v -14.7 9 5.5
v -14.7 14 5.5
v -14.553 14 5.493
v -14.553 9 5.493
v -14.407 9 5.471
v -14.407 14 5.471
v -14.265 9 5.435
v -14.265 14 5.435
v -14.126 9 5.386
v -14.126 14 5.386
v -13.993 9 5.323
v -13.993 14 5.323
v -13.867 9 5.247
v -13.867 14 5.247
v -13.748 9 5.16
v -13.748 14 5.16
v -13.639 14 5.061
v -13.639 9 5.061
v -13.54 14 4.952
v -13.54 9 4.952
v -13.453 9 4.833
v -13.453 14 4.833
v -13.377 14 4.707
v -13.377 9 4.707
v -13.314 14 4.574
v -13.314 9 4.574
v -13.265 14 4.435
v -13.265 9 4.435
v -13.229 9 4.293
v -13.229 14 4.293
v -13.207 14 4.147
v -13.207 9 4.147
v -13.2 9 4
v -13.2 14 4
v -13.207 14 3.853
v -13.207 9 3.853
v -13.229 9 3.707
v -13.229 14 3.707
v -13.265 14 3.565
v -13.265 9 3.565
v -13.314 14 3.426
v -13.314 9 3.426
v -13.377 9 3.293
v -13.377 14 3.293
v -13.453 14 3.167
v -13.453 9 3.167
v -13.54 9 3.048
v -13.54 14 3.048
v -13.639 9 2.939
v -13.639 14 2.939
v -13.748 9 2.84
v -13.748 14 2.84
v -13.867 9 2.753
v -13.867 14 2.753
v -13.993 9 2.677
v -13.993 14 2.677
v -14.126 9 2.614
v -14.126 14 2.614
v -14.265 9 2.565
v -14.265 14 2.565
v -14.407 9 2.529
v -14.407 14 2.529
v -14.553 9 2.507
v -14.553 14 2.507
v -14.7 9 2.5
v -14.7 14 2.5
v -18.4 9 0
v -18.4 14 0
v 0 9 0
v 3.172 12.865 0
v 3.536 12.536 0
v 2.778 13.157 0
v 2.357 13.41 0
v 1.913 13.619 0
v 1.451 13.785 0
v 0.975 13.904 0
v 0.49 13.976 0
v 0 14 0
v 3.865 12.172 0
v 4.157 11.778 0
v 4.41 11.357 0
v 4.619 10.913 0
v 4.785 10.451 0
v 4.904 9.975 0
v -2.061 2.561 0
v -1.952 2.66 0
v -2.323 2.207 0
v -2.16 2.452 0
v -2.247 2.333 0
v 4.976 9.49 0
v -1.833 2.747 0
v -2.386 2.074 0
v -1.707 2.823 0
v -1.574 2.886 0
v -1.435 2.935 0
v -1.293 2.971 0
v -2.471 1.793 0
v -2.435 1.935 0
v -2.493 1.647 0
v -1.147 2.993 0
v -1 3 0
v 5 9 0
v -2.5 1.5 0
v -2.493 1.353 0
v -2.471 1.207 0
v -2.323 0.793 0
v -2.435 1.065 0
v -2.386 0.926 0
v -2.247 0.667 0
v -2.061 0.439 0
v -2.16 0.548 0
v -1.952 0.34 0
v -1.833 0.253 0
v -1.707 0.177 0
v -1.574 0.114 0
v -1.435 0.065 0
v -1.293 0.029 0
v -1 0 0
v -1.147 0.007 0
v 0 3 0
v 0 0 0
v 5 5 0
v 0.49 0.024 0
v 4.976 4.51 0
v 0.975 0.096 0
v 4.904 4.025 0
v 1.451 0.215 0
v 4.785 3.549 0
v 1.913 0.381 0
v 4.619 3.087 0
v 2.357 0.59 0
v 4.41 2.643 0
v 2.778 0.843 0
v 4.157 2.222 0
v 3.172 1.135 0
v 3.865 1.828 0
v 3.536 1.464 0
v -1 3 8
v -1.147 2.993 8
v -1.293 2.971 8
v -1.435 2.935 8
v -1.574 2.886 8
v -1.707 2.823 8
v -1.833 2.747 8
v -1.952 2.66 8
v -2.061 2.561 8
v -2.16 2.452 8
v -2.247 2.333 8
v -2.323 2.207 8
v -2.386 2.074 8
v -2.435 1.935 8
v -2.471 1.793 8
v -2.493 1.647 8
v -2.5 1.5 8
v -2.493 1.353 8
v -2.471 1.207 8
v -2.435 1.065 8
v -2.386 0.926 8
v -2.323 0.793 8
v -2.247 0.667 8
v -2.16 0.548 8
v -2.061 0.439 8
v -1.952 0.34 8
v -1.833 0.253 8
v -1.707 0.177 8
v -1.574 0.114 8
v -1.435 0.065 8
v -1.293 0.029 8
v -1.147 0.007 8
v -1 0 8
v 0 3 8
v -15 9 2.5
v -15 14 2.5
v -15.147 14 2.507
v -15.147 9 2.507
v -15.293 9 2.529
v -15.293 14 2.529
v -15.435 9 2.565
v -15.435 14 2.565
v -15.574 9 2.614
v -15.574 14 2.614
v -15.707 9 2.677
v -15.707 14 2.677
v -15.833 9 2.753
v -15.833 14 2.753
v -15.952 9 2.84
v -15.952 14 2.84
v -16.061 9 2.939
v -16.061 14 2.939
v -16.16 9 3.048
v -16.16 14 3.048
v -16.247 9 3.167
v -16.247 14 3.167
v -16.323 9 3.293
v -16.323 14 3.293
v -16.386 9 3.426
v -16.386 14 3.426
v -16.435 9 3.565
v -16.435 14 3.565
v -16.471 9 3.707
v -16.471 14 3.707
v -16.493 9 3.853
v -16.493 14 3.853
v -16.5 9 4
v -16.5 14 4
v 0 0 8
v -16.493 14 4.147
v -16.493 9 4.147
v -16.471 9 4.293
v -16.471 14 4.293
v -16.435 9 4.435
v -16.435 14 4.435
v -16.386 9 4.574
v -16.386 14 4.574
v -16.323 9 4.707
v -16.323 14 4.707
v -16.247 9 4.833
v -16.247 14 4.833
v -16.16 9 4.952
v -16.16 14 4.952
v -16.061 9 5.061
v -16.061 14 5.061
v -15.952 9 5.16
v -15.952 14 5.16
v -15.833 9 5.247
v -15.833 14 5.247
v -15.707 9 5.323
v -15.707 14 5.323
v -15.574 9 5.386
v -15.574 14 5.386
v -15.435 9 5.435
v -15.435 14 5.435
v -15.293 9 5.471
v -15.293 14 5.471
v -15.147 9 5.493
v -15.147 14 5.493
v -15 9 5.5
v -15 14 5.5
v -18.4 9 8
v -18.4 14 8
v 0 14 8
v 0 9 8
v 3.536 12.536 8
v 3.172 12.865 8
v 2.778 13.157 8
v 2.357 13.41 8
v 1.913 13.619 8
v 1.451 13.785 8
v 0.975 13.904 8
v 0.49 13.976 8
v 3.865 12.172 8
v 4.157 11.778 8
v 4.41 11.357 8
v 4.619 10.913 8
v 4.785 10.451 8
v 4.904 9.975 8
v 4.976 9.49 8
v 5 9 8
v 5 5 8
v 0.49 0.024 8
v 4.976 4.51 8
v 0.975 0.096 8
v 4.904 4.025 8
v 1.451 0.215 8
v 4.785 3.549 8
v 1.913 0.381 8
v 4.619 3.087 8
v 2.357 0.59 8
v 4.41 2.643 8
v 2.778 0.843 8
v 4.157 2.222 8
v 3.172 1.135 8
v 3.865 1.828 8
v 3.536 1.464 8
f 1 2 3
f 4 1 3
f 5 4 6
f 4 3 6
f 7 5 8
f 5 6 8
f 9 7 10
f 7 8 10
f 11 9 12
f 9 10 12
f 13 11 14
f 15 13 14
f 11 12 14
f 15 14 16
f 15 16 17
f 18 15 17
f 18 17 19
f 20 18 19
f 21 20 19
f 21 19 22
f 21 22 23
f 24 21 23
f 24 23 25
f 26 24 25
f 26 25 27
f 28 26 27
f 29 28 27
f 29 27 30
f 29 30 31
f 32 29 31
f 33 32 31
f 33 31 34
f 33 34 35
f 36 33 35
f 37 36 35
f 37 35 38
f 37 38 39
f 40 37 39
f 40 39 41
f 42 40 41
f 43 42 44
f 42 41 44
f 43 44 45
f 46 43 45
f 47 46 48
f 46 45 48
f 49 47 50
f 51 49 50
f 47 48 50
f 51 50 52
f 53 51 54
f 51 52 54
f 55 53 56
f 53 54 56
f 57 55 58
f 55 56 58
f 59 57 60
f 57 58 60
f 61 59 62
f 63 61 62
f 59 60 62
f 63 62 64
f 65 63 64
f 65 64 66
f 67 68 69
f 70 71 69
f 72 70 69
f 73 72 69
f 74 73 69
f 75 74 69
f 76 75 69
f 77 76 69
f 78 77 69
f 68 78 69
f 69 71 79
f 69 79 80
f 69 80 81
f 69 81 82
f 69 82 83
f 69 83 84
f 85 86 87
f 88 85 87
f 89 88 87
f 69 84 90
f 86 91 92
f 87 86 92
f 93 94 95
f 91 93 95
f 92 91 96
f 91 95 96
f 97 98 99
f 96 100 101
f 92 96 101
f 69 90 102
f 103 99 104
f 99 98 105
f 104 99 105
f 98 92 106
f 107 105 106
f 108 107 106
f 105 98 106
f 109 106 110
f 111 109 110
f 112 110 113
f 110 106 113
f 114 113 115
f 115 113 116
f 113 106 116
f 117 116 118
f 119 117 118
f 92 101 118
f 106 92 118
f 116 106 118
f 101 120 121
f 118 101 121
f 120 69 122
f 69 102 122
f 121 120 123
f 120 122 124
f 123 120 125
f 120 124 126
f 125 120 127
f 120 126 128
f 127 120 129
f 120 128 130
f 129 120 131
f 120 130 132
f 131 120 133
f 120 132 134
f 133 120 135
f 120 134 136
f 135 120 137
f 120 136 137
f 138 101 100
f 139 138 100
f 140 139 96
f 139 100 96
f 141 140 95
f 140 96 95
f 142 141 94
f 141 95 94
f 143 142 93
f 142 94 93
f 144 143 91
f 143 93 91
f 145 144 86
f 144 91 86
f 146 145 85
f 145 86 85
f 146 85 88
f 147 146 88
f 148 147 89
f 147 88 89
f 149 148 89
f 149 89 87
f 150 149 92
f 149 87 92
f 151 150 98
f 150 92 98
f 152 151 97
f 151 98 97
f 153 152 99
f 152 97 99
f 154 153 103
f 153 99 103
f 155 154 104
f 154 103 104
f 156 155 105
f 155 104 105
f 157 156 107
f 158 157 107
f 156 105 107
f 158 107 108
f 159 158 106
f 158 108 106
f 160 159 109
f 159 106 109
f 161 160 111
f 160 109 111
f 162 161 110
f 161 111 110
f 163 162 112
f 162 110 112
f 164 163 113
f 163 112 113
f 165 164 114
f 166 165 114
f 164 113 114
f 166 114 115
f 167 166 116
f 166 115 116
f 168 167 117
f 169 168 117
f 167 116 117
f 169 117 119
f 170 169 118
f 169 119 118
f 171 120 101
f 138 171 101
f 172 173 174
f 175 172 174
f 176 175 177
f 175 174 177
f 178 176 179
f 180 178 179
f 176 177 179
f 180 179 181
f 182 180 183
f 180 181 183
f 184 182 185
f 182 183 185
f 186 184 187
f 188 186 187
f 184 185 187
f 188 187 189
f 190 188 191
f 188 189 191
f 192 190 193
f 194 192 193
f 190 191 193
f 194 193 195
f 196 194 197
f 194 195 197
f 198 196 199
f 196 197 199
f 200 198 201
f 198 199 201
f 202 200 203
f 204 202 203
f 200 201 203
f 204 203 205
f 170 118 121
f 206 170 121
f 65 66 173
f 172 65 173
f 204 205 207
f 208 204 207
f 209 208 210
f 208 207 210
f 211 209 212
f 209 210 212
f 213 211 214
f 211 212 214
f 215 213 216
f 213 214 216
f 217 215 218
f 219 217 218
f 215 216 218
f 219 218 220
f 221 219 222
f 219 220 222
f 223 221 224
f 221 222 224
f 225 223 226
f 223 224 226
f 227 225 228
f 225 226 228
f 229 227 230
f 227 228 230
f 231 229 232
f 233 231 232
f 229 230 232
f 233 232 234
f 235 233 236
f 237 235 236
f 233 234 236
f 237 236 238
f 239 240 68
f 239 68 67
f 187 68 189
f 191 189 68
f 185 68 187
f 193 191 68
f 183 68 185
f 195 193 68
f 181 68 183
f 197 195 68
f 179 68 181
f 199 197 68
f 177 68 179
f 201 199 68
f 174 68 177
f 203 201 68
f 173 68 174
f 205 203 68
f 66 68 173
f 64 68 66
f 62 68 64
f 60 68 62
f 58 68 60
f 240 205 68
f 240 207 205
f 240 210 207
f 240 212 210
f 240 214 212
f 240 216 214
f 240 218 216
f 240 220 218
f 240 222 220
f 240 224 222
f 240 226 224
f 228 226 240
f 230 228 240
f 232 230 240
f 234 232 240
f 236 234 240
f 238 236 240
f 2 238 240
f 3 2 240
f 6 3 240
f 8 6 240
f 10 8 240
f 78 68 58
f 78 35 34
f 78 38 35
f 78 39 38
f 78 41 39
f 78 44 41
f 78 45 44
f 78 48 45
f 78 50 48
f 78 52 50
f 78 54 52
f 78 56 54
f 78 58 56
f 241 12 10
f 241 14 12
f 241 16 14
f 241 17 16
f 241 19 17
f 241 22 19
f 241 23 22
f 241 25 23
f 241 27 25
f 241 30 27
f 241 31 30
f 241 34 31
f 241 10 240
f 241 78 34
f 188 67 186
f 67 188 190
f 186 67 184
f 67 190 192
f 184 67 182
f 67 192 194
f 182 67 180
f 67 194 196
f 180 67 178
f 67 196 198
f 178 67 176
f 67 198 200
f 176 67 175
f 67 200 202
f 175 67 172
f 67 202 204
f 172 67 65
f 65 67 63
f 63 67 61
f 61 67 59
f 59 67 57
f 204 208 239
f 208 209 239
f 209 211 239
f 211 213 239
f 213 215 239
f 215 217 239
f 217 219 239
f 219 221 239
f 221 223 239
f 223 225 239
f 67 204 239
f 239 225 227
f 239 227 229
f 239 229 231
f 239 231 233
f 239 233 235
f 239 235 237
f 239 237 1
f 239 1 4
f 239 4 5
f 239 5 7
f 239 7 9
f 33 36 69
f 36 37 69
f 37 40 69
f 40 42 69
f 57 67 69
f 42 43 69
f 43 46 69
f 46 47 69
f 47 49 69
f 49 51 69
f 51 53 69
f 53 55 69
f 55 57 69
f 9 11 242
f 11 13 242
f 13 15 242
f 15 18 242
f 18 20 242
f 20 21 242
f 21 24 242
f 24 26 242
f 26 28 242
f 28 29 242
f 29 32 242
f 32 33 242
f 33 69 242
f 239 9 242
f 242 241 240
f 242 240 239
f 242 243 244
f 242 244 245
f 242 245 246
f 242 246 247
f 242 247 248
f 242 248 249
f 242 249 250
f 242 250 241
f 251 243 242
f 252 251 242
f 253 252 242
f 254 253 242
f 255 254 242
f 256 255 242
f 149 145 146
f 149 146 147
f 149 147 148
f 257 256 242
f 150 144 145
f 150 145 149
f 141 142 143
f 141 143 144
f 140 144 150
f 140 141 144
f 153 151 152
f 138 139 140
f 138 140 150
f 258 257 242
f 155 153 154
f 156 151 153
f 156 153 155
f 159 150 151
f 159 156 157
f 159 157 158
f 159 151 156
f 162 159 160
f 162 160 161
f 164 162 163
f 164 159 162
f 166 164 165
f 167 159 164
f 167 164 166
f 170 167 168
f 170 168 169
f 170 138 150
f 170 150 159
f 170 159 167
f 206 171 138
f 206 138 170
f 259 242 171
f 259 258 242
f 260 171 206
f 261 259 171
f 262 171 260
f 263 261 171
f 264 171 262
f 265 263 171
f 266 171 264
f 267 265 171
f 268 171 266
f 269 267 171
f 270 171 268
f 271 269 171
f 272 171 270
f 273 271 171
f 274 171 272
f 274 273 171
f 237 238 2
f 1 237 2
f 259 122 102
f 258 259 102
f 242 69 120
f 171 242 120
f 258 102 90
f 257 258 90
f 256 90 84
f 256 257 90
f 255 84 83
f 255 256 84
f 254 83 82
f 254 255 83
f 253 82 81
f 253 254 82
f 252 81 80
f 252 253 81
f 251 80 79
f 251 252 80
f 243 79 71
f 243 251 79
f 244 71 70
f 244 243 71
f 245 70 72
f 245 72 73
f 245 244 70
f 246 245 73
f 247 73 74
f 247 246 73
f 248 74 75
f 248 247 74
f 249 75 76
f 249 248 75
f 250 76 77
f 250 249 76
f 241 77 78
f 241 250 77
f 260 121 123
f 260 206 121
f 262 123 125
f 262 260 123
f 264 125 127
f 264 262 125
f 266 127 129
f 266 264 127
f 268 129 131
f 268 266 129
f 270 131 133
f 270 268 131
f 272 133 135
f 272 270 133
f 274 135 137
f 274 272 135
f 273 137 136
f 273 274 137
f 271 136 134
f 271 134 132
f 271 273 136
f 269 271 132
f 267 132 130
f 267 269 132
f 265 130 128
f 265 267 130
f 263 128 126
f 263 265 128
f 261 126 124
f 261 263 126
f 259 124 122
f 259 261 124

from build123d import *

# Parameters (mm, degrees)
F1_DEPTH = 8
F3_DEPTH = 25
F4_R     = 5
F5_DEPTH = 0.4


with BuildPart() as f1:
    # F0 (on Top) → F1 (new body)
    with BuildSketch(Plane.XY):
        with BuildLine():
            Line((-1, 0), (0, 0))
            Line((0, 0), (5, 0))
            Line((5, 0), (5, 14))
            Line((5, 14), (-18, 14))
            Line((-18, 14), (-18, 9))
            Line((-18, 9), (0, 9))
            Line((0, 9), (0, 3))
            Line((0, 3), (-1, 3))
            ThreePointArc((-1, 3), (-2.5, 1.5), (-1, 0))
        make_face()
    extrude(amount=F1_DEPTH)

    # F2 (on face) → F3 (cut)
    with BuildSketch(Plane(origin=(0, 14, 0), x_dir=(-1, 0, 0), z_dir=(0, 1, 0))):
        with BuildLine():
            ThreePointArc((15, 2.5), (16.0606601718, 2.9393398282), (16.5, 4))
            ThreePointArc((16.5, 4), (16.0606601718, 5.0606601718), (15, 5.5))
            Line((15, 5.5), (15, 5.4696938457))
            ThreePointArc((15, 5.4696938457), (15.8618950039, 4.9486832981), (16.2, 4))
            ThreePointArc((16.2, 4), (15.8618950039, 3.0513167019), (15, 2.5303061543))
            Line((15, 2.5303061543), (15, 2.5))
        make_face()
        with BuildLine():
            ThreePointArc((15, 5.4696938457), (14.9252882939, 5.4829852274), (14.85, 5.4924811557))
            ThreePointArc((14.85, 5.4924811557), (13.5, 4), (14.85, 2.5075188443))
            ThreePointArc((14.85, 2.5075188443), (14.9252882939, 2.5170147726), (15, 2.5303061543))
            Line((15, 2.5303061543), (15, 5.4696938457))
        make_face()
        with BuildLine():
            ThreePointArc((14.85, 2.5075188443), (13.5, 4), (14.85, 5.4924811557))
            ThreePointArc((14.85, 5.4924811557), (14.7750941626, 5.4981191097), (14.7, 5.5))
            ThreePointArc((14.7, 5.5), (13.2, 4), (14.7, 2.5))
            ThreePointArc((14.7, 2.5), (14.7750941626, 2.5018808903), (14.85, 2.5075188443))
        make_face()
        with BuildLine():
            ThreePointArc((16.2, 4), (15.8618950039, 4.9486832981), (15, 5.4696938457))
            Line((15, 5.4696938457), (15, 2.5303061543))
            ThreePointArc((15, 2.5303061543), (15.8618950039, 3.0513167019), (16.2, 4))
        make_face()
        with BuildLine():
            Line((15, 5.4696938457), (15, 5.5))
            ThreePointArc((15, 5.5), (14.9249058374, 5.4981191097), (14.85, 5.4924811557))
            ThreePointArc((14.85, 5.4924811557), (14.9252882939, 5.4829852274), (15, 5.4696938457))
        make_face()
        with BuildLine():
            ThreePointArc((14.85, 2.5075188443), (14.9249058374, 2.5018808903), (15, 2.5))
            Line((15, 2.5), (15, 2.5303061543))
            ThreePointArc((15, 2.5303061543), (14.9252882939, 2.5170147726), (14.85, 2.5075188443))
        make_face()
        with BuildLine():
            ThreePointArc((14.85, 5.4924811557), (14.9249058374, 5.4981191097), (15, 5.5))
            Line((15, 5.5), (14.7, 5.5))
            ThreePointArc((14.7, 5.5), (14.7750941626, 5.4981191097), (14.85, 5.4924811557))
        make_face()
        with BuildLine():
            Line((14.7, 2.5), (15, 2.5))
            ThreePointArc((15, 2.5), (14.9249058374, 2.5018808903), (14.85, 2.5075188443))
            ThreePointArc((14.85, 2.5075188443), (14.7750941626, 2.5018808903), (14.7, 2.5))
        make_face()
    extrude(amount=-F3_DEPTH, mode=Mode.SUBTRACT)

    # F4
    f4_edges = [f1.edges().sort_by_distance(p)[0] for p in [
        (5, 14, 4),
        (5, 0, 4),
    ]]
    fillet(f4_edges, radius=F4_R)

    # F5 (add): a face of the model
    f5_faces = [f1.faces().sort_by_distance(p)[0] for p in [
        (-18, 11.5, 4),
    ]]
    extrude(f5_faces, amount=F5_DEPTH)


solid = f1.part
